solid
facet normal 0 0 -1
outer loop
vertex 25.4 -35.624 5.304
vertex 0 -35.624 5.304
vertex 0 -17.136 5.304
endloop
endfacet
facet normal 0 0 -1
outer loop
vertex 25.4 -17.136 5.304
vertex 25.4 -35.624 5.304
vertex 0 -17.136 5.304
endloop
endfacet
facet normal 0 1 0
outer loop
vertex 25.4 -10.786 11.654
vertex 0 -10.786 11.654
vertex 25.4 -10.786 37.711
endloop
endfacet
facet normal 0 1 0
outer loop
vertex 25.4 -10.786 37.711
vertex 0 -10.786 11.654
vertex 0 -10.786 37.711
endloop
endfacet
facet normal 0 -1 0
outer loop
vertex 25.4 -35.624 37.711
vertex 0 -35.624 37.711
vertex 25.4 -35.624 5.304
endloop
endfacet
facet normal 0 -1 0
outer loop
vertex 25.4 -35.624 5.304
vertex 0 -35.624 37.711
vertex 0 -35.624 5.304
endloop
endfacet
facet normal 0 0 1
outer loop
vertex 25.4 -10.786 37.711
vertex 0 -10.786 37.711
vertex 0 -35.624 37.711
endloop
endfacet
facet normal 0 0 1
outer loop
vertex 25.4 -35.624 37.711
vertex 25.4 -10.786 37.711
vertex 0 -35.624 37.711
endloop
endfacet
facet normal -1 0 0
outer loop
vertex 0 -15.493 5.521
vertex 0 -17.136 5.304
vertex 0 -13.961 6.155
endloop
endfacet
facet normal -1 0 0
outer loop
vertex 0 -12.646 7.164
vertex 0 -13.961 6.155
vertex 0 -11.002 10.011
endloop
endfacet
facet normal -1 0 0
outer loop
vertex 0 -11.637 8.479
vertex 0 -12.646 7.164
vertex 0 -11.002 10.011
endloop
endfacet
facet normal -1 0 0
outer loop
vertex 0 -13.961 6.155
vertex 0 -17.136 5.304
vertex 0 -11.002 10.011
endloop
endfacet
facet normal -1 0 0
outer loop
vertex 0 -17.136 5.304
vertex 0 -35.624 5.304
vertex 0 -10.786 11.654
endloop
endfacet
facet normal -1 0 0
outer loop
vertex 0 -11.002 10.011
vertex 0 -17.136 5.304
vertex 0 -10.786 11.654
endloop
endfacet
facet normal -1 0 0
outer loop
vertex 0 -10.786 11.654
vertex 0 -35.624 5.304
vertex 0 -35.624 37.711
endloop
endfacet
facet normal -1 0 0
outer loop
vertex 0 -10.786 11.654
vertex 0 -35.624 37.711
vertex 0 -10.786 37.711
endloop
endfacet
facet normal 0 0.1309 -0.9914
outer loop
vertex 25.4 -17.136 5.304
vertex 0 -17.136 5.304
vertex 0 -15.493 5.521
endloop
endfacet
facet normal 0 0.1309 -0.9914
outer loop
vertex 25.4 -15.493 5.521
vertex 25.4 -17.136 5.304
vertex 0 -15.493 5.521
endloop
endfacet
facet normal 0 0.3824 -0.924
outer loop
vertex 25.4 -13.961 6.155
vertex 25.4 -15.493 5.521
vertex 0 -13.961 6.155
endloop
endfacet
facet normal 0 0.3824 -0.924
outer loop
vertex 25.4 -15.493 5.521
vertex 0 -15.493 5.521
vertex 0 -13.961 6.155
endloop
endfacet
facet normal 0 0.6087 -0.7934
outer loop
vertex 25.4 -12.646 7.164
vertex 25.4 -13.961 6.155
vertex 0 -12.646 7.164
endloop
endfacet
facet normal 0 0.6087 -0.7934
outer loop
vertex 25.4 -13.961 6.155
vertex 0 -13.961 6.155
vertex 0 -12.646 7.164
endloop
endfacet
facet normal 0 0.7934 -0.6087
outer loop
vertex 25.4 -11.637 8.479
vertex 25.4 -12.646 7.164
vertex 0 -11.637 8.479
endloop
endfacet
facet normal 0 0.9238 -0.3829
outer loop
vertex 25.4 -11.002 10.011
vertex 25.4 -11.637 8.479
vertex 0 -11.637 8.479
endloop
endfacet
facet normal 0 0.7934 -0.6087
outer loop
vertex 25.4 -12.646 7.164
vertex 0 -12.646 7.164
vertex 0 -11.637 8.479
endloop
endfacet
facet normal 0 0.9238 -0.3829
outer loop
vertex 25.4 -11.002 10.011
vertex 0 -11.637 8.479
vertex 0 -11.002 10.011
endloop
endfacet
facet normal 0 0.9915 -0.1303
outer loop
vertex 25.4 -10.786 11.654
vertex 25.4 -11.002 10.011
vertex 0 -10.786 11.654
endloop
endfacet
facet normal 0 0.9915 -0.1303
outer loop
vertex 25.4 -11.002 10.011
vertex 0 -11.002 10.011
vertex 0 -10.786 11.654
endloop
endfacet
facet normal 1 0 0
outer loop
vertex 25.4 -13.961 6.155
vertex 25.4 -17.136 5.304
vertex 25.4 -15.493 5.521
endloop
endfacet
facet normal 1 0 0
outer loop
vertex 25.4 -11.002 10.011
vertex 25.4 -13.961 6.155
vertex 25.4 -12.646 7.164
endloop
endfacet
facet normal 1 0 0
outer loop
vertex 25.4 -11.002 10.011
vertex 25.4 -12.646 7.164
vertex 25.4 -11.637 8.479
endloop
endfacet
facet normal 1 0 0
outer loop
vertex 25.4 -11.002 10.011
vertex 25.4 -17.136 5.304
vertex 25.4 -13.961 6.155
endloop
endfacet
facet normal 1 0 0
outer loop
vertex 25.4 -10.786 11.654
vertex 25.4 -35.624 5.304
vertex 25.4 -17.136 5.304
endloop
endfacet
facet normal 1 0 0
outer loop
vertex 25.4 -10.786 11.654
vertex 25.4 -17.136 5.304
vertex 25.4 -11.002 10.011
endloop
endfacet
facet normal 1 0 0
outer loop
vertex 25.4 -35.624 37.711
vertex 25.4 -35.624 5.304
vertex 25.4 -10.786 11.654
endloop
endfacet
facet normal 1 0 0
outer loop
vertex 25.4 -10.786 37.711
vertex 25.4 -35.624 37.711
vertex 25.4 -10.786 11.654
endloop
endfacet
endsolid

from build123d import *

# Parameters (mm, degrees)
F1_DEPTH = 25.4


with BuildPart() as f1:
    # F0 (on Right) → F1 (new body)
    with BuildSketch(Plane.YZ):
        with BuildLine():
            Line((-10.786085, 37.710954), (-35.62377, 37.710954))
            Line((-35.62377, 37.710954), (-35.62377, 5.30417))
            Line((-35.62377, 5.30417), (-17.136085, 5.30417))
            ThreePointArc((-17.136085, 5.30417), (-12.645957, 7.164042), (-10.786085, 11.65417))
            Line((-10.786085, 11.65417), (-10.786085, 37.710954))
        make_face()
    extrude(amount=F1_DEPTH)


solid = f1.part
